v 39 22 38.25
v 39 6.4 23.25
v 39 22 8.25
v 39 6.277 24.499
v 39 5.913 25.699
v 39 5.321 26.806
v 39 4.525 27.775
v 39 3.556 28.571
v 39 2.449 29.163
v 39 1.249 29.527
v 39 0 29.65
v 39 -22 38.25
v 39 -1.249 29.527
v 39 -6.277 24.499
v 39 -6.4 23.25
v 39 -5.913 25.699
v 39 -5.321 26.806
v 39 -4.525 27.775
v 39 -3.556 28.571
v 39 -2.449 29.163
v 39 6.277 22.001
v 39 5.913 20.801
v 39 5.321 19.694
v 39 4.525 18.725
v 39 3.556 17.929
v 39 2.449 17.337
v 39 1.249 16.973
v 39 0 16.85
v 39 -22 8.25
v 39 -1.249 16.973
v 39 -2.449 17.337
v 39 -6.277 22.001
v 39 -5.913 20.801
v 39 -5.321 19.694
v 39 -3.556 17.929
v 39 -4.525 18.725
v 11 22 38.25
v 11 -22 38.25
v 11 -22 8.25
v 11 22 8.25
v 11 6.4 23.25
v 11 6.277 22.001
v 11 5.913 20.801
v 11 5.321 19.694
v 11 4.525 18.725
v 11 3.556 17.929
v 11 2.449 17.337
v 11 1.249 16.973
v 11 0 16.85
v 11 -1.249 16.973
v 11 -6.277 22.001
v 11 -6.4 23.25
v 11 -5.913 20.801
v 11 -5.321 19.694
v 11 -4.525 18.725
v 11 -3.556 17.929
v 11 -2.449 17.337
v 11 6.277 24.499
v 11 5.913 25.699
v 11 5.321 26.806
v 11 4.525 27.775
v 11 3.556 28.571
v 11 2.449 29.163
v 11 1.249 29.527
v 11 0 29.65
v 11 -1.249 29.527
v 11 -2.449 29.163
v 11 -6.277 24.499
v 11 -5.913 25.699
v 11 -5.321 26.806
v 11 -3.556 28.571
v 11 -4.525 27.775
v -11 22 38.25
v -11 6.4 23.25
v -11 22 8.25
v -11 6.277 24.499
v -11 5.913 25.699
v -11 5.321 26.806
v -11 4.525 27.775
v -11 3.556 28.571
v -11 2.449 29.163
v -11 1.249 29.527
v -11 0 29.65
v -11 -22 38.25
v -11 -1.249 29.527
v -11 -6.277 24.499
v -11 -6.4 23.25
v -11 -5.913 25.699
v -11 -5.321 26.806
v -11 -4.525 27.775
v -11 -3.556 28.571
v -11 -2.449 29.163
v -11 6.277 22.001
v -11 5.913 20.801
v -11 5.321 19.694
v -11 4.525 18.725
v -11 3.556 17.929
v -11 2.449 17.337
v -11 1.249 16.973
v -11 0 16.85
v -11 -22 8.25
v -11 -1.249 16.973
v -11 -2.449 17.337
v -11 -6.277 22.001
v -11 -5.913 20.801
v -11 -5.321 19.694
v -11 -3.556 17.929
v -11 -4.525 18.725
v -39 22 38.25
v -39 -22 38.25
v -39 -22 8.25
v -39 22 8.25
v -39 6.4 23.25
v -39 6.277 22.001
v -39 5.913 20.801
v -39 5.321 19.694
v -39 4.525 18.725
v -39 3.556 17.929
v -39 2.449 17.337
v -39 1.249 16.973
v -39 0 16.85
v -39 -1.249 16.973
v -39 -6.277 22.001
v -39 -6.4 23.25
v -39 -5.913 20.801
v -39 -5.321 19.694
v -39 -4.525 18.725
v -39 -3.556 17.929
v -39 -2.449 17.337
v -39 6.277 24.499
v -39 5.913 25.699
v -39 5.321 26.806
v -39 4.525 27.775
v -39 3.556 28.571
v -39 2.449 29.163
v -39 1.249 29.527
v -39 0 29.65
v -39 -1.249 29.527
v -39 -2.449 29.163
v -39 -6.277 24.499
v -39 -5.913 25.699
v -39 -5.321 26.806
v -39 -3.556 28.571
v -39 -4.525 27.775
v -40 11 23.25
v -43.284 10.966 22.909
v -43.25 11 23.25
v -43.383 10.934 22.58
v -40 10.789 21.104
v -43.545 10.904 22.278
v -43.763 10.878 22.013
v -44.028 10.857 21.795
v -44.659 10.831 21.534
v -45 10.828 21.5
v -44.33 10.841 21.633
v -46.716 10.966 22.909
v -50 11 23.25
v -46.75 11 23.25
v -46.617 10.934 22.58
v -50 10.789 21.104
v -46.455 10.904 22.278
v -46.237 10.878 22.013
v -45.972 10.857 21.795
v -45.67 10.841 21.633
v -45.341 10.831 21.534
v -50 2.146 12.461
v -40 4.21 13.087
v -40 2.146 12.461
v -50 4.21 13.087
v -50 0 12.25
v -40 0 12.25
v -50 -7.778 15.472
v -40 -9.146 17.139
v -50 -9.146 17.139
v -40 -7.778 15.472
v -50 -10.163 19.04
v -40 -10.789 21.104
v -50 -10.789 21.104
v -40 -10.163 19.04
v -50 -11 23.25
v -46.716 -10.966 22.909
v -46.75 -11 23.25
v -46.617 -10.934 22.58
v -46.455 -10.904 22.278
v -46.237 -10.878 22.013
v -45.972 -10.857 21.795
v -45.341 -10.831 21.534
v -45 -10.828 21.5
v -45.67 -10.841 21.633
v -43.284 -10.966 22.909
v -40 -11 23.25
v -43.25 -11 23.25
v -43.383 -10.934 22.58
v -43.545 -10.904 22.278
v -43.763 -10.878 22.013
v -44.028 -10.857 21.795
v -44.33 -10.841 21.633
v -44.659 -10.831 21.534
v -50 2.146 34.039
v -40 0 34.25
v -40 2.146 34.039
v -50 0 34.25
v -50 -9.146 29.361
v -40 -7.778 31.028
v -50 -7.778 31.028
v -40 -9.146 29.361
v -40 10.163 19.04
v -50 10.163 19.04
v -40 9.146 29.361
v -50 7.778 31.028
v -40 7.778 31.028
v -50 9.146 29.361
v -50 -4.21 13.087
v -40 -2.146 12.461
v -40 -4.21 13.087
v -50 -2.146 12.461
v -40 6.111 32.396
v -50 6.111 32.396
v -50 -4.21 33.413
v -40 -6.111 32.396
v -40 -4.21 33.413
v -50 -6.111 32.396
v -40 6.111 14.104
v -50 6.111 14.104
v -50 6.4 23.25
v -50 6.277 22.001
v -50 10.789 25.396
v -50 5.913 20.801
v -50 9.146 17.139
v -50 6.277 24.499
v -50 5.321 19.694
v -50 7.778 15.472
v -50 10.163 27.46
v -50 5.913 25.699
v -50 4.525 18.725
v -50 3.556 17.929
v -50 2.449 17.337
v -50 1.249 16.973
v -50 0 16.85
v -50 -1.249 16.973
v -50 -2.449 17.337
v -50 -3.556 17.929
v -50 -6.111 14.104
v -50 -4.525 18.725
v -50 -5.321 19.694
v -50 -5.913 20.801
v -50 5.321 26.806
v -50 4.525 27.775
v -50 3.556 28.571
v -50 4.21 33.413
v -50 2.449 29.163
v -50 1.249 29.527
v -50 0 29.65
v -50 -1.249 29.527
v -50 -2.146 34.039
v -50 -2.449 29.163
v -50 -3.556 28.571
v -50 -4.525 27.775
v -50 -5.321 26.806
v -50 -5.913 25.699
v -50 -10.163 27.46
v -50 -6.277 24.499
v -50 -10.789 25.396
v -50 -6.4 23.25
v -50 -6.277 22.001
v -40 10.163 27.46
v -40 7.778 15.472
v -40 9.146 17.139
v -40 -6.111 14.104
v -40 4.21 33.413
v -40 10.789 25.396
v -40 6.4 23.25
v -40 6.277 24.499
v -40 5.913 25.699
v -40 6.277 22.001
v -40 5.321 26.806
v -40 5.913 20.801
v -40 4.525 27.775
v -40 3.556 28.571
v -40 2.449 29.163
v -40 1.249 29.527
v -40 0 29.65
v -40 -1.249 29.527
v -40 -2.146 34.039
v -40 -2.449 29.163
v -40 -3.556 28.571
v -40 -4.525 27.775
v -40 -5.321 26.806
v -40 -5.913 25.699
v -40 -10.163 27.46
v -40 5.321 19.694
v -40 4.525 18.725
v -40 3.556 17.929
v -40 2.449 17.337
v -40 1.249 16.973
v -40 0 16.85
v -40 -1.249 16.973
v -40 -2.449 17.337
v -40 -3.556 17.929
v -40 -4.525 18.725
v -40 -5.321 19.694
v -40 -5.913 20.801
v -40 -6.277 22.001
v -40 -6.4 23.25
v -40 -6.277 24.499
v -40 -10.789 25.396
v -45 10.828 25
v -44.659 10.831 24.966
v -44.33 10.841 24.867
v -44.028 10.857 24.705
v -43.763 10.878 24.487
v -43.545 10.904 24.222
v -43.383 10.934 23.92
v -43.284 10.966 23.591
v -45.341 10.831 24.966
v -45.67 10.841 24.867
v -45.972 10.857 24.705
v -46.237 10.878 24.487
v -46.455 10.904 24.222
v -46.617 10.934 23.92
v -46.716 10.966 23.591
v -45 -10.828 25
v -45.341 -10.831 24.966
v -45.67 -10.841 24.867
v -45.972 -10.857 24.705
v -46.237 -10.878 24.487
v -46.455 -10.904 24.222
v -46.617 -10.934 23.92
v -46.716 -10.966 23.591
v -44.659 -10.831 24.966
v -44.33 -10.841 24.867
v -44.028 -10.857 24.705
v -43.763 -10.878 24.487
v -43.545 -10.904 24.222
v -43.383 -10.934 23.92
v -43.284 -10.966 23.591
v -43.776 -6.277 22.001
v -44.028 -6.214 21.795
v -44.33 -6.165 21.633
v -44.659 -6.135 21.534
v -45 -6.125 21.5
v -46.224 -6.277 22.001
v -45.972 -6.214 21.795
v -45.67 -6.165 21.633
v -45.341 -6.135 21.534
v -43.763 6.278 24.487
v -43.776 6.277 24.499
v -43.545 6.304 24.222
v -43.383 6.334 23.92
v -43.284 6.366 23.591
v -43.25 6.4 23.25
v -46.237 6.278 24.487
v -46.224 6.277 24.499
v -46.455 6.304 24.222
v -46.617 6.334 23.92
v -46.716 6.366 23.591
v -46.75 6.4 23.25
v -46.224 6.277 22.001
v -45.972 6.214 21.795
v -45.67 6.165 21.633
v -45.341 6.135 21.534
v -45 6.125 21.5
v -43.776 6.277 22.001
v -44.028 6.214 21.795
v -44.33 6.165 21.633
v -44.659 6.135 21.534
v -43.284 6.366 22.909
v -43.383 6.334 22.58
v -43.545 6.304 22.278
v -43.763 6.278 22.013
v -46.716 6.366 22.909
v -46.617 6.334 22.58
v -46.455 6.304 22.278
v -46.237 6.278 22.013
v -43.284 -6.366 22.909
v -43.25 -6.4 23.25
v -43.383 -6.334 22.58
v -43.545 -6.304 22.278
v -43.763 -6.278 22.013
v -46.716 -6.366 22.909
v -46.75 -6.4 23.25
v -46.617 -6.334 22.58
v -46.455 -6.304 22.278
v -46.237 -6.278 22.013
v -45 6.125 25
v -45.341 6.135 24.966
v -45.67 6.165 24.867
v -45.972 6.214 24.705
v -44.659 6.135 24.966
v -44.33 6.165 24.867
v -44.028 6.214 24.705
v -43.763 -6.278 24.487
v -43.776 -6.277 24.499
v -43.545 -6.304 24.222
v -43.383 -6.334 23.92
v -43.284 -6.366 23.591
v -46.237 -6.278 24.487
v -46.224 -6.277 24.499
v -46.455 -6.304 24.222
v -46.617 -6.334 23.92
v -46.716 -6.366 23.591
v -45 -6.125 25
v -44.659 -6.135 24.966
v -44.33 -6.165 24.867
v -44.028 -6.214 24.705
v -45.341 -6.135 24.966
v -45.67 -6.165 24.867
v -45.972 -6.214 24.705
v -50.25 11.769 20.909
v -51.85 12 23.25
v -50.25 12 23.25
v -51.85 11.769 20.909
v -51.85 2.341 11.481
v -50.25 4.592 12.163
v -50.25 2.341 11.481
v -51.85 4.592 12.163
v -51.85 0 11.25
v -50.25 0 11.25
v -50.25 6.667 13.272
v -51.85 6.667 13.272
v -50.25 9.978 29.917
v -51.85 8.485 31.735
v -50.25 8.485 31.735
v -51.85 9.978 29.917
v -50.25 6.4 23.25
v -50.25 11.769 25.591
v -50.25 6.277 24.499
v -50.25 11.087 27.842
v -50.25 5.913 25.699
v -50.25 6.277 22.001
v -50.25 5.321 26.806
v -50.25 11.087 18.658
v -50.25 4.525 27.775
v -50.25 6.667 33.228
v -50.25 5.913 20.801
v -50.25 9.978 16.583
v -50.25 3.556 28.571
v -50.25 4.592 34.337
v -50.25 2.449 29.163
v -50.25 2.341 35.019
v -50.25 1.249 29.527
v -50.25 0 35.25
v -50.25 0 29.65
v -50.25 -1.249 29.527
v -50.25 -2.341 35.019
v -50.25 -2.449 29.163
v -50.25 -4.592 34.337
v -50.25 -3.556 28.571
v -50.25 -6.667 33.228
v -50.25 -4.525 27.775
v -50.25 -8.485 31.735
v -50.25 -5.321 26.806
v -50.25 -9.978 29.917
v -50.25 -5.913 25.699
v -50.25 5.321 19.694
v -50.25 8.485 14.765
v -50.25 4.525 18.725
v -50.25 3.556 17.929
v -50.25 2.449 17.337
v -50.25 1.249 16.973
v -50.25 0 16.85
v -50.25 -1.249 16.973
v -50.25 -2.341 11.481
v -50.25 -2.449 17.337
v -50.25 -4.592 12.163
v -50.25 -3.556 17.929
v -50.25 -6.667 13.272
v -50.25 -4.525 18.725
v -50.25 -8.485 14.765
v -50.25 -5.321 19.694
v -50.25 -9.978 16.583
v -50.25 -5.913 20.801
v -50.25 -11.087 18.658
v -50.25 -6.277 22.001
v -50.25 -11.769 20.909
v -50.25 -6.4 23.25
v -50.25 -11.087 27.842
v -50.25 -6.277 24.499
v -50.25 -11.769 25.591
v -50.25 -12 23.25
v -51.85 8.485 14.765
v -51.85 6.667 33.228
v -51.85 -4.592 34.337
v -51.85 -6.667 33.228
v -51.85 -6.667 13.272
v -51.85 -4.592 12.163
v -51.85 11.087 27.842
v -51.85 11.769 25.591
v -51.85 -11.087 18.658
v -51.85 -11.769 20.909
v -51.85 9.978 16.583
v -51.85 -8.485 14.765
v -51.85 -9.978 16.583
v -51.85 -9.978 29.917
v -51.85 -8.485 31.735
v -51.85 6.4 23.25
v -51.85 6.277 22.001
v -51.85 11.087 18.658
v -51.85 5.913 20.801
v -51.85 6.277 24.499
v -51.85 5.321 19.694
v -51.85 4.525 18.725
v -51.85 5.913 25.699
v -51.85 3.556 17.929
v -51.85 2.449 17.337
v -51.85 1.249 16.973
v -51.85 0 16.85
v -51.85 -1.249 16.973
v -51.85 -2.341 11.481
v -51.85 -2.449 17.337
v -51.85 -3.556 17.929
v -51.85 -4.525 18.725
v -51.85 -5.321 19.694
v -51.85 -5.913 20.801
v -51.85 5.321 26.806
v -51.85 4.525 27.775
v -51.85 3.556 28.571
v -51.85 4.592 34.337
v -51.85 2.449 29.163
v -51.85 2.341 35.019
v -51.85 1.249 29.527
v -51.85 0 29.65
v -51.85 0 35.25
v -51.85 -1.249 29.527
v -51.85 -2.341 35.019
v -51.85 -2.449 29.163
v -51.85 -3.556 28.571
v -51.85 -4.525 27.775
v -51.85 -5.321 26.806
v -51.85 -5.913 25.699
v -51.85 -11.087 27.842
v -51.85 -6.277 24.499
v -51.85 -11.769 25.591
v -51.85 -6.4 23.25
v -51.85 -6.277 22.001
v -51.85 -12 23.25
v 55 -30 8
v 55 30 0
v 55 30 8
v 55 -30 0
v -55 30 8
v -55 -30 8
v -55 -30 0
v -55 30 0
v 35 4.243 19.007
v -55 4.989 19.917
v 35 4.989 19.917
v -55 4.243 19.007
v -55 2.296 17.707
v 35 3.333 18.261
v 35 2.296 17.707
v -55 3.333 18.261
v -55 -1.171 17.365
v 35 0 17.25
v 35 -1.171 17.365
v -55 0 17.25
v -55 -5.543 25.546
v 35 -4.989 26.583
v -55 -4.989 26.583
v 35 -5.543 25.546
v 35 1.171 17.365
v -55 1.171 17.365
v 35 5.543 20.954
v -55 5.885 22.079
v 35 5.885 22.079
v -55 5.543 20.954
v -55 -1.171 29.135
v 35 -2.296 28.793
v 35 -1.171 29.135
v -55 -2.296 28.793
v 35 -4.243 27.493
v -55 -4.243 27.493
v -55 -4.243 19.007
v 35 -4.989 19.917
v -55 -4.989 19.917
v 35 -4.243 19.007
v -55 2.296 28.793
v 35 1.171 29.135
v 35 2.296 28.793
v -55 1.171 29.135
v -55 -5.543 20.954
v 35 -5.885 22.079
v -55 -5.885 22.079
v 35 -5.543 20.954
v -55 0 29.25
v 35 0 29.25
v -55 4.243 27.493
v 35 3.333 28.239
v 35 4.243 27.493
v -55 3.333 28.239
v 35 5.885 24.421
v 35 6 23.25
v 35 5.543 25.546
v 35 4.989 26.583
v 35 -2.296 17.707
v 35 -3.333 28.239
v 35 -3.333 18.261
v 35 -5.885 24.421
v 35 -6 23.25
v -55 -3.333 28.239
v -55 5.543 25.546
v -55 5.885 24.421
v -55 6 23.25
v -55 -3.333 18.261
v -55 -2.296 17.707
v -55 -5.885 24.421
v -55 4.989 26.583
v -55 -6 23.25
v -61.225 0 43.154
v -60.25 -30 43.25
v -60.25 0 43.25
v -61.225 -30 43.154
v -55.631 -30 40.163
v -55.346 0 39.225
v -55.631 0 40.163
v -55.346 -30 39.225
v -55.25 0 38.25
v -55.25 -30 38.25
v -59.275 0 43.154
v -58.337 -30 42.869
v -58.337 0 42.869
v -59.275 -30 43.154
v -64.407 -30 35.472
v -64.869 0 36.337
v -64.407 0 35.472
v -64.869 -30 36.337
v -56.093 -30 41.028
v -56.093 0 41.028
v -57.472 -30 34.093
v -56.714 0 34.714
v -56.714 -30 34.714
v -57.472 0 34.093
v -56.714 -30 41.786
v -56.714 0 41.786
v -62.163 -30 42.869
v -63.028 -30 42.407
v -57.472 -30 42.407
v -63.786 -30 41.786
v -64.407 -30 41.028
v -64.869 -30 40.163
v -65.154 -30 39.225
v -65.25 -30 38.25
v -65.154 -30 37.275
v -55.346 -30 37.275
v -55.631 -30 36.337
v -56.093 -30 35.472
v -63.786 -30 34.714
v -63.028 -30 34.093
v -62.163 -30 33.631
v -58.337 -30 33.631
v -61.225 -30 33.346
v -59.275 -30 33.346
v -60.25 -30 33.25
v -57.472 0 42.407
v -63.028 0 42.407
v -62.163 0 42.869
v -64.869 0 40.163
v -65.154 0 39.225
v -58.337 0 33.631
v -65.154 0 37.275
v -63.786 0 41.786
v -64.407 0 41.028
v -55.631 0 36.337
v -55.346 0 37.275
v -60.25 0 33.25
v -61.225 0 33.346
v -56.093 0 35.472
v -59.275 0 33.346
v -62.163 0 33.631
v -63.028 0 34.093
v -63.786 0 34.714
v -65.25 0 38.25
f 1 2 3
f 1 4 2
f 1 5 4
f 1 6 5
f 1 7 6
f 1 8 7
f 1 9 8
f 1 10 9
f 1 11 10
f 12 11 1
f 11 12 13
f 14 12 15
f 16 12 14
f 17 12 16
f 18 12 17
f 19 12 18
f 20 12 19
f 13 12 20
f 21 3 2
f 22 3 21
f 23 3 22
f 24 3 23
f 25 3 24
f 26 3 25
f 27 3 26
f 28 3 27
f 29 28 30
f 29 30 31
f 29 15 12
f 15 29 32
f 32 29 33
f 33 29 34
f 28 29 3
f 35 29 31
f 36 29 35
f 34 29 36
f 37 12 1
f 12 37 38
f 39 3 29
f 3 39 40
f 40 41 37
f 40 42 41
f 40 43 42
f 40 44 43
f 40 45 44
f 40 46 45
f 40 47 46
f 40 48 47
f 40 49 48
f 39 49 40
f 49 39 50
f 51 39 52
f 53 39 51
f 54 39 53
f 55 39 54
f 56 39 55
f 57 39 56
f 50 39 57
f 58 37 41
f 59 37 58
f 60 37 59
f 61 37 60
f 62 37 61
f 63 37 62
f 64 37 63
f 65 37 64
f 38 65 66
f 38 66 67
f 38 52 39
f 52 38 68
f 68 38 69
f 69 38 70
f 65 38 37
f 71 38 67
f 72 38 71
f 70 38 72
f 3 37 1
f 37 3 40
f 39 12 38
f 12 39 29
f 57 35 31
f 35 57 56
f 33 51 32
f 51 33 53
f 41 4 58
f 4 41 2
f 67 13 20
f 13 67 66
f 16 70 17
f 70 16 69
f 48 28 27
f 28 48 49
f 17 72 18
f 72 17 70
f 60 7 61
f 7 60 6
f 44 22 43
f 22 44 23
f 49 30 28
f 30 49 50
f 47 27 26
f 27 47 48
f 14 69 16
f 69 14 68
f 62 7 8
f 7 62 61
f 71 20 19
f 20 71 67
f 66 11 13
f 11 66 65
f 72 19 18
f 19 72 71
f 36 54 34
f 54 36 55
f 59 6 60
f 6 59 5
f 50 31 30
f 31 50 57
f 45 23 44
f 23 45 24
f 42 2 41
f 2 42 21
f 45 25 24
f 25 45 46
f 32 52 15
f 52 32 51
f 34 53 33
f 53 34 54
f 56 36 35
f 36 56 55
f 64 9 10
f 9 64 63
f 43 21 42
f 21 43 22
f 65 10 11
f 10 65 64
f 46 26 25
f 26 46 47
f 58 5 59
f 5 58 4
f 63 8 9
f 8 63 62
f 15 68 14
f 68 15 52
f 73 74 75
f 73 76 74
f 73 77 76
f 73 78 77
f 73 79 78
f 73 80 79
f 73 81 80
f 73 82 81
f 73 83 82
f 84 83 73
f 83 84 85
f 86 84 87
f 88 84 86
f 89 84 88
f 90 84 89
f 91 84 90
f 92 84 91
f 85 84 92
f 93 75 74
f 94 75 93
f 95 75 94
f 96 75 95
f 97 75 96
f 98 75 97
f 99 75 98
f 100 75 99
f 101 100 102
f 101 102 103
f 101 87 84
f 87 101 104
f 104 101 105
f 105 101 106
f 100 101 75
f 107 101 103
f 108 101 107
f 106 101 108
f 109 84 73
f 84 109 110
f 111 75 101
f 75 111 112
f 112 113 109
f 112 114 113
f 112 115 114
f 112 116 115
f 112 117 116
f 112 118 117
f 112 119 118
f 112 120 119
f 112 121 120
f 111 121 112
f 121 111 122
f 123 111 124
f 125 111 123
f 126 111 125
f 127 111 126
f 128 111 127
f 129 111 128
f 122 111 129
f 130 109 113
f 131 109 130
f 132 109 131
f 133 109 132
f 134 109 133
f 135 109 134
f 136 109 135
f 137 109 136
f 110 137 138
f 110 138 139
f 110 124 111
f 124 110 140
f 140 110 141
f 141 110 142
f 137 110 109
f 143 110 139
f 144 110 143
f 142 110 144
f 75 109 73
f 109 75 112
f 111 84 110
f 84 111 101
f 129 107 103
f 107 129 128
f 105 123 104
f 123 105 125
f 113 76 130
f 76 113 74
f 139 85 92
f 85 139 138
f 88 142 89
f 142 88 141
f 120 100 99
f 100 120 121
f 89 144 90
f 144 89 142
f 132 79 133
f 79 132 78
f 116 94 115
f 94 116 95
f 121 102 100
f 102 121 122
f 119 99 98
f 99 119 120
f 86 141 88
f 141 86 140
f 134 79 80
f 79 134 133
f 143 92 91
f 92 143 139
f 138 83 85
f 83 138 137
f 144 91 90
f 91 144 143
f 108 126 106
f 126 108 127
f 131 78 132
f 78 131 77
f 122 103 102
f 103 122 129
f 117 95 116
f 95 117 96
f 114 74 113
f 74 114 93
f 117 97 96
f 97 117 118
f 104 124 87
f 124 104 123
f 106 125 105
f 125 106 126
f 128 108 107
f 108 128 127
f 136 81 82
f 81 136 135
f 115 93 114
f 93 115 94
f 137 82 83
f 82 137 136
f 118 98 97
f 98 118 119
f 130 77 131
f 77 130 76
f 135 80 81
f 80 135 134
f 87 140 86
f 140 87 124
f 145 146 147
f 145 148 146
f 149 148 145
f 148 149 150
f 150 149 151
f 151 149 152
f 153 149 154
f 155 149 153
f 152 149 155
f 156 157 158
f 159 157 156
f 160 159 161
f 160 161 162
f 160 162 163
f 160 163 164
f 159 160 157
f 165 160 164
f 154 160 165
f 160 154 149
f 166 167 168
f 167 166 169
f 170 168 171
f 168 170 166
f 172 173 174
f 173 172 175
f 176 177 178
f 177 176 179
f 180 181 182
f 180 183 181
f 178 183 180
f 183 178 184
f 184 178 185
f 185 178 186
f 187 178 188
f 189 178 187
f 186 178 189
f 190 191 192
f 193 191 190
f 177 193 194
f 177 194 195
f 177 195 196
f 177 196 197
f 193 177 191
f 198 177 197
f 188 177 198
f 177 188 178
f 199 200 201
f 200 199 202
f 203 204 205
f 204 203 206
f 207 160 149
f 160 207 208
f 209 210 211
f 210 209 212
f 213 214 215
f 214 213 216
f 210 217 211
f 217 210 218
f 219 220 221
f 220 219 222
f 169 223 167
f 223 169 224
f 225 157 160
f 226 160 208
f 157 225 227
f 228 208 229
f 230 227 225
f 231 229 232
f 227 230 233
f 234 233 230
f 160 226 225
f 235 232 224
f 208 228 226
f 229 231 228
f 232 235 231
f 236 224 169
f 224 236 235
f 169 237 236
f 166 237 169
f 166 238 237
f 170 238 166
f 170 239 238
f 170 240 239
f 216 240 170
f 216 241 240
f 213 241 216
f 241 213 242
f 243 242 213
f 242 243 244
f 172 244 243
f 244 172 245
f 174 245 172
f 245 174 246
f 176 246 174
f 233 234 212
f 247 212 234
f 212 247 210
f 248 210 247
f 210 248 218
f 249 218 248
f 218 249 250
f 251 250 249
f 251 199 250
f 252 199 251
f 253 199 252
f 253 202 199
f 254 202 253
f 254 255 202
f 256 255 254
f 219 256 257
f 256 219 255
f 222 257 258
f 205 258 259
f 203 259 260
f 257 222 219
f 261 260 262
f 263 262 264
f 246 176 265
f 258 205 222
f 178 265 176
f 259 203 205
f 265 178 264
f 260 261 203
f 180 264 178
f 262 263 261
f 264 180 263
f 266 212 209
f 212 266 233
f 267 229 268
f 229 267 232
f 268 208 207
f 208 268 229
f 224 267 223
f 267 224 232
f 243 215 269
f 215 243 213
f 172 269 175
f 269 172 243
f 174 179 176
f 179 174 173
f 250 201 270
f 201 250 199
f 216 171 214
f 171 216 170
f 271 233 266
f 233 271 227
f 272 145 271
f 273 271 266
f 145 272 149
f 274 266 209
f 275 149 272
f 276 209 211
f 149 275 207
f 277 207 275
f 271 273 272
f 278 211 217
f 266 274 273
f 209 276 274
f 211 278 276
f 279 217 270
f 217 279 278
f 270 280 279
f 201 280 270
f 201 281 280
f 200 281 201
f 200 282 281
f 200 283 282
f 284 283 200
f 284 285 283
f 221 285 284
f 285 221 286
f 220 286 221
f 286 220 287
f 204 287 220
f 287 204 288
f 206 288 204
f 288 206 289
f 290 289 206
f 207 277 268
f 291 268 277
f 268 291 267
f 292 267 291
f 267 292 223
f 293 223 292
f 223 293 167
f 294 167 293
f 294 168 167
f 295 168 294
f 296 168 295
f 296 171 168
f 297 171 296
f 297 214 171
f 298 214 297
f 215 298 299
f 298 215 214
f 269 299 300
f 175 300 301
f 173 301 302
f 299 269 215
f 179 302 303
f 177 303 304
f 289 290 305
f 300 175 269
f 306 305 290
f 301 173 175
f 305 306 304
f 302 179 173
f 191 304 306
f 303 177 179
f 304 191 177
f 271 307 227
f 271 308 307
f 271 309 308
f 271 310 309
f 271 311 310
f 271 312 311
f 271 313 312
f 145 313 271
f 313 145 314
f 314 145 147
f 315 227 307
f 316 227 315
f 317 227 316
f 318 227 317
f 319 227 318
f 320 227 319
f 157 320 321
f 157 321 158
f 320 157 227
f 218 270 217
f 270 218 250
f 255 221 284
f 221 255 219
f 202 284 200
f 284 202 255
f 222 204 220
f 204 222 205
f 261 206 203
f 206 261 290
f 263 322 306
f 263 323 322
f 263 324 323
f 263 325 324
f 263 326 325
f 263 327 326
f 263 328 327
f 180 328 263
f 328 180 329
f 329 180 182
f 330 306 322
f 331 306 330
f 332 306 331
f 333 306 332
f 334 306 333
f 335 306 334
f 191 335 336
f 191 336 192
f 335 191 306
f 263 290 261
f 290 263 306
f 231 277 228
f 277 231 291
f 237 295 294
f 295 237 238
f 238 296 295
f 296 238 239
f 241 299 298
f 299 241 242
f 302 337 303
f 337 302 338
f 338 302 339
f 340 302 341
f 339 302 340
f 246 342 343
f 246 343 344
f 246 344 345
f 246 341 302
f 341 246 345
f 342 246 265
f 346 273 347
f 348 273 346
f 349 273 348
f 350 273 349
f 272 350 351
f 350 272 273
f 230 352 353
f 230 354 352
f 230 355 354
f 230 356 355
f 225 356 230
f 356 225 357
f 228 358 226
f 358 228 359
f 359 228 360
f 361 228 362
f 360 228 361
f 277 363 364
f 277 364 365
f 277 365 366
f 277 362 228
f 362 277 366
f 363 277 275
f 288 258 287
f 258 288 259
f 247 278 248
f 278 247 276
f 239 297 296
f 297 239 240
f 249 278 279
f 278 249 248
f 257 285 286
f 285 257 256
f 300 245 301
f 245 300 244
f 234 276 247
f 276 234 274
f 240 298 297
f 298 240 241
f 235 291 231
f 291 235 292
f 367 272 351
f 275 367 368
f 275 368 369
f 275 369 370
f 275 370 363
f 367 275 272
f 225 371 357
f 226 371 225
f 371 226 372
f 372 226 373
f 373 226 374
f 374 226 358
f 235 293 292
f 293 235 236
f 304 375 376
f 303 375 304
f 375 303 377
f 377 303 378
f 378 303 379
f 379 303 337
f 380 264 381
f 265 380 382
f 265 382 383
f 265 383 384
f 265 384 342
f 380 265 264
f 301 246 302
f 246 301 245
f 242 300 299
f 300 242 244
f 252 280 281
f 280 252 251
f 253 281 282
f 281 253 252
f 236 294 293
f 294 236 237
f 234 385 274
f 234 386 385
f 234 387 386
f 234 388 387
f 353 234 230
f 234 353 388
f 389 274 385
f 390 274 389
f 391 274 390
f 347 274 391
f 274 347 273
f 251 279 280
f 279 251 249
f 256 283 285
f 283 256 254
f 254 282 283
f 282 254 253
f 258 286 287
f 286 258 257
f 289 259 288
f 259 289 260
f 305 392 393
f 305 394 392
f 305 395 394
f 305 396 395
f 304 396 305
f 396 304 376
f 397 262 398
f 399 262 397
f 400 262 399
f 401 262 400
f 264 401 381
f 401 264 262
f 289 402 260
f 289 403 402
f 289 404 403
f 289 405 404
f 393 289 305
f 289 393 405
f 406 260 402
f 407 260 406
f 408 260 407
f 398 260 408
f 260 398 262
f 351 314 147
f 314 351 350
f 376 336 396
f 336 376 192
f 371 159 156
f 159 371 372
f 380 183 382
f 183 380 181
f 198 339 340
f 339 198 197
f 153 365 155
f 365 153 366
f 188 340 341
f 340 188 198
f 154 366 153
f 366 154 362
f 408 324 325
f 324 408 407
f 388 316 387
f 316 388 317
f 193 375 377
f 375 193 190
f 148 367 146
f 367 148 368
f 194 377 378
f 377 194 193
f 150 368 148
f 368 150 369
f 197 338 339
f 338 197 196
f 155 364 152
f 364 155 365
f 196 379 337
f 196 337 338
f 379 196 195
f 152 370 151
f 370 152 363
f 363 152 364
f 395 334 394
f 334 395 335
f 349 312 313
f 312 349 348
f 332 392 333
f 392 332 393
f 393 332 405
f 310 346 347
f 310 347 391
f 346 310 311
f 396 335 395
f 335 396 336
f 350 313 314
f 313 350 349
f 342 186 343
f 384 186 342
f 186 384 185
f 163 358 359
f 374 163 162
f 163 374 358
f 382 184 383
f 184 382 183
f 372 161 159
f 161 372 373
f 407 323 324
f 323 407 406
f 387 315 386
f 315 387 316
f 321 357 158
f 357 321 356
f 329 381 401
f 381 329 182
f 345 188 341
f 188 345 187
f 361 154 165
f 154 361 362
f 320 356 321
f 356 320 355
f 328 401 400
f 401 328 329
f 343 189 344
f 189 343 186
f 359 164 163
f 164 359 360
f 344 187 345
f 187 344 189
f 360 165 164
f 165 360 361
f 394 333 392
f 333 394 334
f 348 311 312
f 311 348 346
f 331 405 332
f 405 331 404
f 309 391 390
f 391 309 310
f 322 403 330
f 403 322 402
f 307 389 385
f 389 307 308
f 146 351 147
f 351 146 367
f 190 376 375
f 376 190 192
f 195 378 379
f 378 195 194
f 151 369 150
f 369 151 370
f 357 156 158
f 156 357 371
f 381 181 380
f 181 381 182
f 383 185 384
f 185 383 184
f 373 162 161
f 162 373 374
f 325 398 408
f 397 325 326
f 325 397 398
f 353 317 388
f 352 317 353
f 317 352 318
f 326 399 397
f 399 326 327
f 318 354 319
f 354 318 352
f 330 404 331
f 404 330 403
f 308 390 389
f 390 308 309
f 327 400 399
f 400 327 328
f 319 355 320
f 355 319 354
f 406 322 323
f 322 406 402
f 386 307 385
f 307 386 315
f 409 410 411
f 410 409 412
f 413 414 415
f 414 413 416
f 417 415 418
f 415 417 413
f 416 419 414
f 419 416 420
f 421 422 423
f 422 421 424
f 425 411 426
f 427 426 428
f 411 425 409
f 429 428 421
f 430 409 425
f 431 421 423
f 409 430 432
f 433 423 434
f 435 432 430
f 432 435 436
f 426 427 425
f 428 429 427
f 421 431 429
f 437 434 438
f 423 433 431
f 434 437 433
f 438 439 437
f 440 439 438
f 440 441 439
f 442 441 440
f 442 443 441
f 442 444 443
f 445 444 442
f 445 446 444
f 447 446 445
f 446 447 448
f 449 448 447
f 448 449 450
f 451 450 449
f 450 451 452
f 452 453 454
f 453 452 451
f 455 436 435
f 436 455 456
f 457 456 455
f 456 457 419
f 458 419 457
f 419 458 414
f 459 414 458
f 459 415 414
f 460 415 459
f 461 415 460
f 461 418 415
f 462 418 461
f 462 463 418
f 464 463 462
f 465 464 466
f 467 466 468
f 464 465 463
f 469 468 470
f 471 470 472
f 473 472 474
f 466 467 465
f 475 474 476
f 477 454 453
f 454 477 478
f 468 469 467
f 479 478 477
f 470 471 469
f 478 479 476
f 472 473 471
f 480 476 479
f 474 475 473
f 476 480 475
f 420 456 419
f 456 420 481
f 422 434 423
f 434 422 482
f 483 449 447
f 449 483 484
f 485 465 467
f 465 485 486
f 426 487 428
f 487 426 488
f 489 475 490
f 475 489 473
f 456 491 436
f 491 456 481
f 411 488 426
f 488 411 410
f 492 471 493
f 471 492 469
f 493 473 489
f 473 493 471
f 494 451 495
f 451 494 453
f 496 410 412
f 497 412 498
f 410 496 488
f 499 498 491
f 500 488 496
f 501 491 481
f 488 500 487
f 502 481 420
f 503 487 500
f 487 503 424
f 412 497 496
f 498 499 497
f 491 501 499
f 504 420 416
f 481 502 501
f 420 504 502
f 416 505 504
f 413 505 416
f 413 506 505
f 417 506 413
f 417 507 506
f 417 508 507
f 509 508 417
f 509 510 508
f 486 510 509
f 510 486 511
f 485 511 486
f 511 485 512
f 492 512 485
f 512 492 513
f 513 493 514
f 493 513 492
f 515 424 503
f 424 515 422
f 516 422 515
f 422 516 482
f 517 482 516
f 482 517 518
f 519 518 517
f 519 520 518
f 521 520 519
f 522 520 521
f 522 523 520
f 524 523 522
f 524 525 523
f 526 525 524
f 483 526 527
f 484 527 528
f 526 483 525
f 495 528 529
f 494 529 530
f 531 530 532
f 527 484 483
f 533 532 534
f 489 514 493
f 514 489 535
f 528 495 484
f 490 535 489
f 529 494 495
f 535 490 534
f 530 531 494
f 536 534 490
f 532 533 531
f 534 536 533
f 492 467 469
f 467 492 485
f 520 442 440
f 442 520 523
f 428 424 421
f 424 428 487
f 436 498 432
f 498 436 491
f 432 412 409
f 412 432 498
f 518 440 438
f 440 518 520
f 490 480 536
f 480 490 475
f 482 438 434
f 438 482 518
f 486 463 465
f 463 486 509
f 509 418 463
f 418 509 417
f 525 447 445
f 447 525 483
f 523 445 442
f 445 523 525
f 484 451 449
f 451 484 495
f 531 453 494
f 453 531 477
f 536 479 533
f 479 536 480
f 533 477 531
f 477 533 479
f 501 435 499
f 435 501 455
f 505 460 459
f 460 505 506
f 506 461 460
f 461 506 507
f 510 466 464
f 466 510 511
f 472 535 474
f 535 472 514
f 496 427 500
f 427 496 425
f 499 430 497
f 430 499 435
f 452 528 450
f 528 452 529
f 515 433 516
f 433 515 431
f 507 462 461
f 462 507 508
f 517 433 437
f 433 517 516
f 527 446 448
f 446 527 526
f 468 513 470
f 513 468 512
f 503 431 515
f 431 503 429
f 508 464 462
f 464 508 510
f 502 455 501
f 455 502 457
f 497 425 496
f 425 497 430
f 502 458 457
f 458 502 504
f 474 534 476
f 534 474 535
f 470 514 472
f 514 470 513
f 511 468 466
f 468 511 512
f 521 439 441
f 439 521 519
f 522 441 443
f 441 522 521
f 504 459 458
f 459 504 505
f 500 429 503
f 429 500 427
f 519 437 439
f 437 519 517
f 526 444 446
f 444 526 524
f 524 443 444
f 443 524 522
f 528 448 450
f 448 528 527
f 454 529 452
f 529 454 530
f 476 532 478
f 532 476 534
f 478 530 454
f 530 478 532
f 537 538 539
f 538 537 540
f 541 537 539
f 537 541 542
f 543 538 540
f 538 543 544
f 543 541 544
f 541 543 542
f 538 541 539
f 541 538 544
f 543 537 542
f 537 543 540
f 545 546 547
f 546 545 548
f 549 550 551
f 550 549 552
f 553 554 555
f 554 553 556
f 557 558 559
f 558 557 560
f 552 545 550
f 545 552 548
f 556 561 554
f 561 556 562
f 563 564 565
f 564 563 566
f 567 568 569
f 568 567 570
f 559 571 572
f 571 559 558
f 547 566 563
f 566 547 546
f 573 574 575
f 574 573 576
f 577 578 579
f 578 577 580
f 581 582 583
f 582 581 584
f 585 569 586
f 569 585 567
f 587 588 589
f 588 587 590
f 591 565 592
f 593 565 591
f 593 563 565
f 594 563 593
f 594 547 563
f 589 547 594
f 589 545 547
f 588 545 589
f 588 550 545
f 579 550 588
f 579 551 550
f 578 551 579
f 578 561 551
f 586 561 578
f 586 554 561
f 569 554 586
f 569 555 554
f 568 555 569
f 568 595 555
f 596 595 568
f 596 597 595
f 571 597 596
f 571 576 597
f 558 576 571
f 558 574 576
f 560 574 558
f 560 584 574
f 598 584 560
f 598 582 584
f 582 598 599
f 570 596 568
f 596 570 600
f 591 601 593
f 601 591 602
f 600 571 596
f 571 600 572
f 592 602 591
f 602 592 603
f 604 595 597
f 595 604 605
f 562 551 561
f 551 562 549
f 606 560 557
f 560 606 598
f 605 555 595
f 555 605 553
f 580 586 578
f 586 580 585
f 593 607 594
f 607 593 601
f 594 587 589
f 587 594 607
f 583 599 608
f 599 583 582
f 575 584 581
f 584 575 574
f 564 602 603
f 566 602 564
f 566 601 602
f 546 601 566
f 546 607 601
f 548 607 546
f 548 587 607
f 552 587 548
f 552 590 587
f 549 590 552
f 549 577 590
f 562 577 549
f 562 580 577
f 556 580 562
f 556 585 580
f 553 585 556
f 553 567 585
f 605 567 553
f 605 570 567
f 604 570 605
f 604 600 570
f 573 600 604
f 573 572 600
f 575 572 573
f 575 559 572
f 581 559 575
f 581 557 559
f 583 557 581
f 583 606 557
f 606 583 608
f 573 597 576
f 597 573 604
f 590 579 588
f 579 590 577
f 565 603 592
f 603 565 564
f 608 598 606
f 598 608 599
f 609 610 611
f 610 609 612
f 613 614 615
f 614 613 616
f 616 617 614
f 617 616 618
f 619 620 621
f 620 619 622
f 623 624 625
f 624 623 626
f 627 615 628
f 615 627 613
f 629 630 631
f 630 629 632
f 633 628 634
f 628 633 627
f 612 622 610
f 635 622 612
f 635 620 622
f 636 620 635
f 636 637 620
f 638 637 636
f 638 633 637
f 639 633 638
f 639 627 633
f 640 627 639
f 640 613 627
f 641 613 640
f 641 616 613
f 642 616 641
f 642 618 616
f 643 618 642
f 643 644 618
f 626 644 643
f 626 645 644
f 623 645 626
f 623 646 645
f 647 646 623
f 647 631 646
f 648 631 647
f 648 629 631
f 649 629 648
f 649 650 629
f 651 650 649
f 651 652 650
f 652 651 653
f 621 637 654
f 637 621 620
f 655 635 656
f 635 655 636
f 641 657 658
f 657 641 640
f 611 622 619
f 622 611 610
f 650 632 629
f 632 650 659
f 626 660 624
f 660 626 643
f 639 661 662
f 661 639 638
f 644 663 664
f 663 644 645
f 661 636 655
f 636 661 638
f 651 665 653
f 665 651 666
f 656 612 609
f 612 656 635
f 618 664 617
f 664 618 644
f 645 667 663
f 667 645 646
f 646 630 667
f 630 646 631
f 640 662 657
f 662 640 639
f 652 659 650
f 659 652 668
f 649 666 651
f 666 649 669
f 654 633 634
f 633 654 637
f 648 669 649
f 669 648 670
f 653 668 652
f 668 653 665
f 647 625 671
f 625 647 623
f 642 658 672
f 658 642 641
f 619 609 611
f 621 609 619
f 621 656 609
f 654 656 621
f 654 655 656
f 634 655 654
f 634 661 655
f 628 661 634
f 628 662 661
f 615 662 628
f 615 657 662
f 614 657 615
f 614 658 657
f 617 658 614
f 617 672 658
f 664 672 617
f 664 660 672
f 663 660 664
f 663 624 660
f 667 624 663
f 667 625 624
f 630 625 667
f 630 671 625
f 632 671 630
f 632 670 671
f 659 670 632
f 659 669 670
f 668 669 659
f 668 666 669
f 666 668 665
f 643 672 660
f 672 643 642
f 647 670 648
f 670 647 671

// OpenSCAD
$fn = 32;

// ------------------------------------------------------------------------
// Machine vise: screw d12, jaws 28 x 30 mm
// Every part is its own module, assembly() places every instance.
// ------------------------------------------------------------------------

// --- part 1 ---
module vise_bed() {
  difference() {
    translate([-55, -30, 0]) cube([110, 60, 8]);
  }
}

// --- part 2 ---
module vise_jaw() {
  difference() {
    translate([-14, -22, 0]) cube([28, 44, 30]);
    translate([0, 0, 15]) rotate([0, 90, 0]) cylinder(h = 30, d = 12.8, center = true);
  }
}

// --- part 3 ---
module vise_screw() {
  translate([0, 0, -45]) cylinder(h = 90, d = 12);
}

// --- part 4 ---
module screw_collar() {
  difference() {
    cylinder(h = 10, d = 22);
    translate([0, 0, -1]) cylinder(h = 12, d = 12.8);
    translate([0, 0, 5]) rotate([90, 0, 0]) cylinder(h = 24, d = 3.5, center = true);
  }
}

// --- part 5 ---
module screw_washer() {
  difference() {
      translate([0, 0, 0]) cylinder(h = 1.6, d = 24);
      translate([0, 0, -1]) cylinder(h = 3.6, d = 12.8);
    }
}

// --- part 6 ---
module vise_handle() {
  cylinder(h = 30, d = 10);
}

// --- assembly ---
module assembly() {
  color([0.80, 0.24, 0.20]) translate([0, 0, 0]) rotate([0, 0, 0]) vise_bed();
  color([0.20, 0.45, 0.75]) translate([25, 0, 8.25]) rotate([0, 0, 0]) vise_jaw();
  color([0.25, 0.62, 0.32]) translate([-25, 0, 8.25]) rotate([0, 0, 0]) vise_jaw();
  color([0.92, 0.70, 0.18]) translate([-10, 0, 23.25]) rotate([0, 90, 0]) vise_screw();
  color([0.58, 0.35, 0.70]) translate([-50, 0, 23.25]) rotate([0, 90, 0]) screw_collar();
  color([0.16, 0.66, 0.66]) translate([-51.85, 0, 23.25]) rotate([0, 90, 0]) screw_washer();
  color([0.85, 0.48, 0.18]) translate([-60.25, 0, 38.25]) rotate([90, 0, 0]) vise_handle();
}

assembly();
